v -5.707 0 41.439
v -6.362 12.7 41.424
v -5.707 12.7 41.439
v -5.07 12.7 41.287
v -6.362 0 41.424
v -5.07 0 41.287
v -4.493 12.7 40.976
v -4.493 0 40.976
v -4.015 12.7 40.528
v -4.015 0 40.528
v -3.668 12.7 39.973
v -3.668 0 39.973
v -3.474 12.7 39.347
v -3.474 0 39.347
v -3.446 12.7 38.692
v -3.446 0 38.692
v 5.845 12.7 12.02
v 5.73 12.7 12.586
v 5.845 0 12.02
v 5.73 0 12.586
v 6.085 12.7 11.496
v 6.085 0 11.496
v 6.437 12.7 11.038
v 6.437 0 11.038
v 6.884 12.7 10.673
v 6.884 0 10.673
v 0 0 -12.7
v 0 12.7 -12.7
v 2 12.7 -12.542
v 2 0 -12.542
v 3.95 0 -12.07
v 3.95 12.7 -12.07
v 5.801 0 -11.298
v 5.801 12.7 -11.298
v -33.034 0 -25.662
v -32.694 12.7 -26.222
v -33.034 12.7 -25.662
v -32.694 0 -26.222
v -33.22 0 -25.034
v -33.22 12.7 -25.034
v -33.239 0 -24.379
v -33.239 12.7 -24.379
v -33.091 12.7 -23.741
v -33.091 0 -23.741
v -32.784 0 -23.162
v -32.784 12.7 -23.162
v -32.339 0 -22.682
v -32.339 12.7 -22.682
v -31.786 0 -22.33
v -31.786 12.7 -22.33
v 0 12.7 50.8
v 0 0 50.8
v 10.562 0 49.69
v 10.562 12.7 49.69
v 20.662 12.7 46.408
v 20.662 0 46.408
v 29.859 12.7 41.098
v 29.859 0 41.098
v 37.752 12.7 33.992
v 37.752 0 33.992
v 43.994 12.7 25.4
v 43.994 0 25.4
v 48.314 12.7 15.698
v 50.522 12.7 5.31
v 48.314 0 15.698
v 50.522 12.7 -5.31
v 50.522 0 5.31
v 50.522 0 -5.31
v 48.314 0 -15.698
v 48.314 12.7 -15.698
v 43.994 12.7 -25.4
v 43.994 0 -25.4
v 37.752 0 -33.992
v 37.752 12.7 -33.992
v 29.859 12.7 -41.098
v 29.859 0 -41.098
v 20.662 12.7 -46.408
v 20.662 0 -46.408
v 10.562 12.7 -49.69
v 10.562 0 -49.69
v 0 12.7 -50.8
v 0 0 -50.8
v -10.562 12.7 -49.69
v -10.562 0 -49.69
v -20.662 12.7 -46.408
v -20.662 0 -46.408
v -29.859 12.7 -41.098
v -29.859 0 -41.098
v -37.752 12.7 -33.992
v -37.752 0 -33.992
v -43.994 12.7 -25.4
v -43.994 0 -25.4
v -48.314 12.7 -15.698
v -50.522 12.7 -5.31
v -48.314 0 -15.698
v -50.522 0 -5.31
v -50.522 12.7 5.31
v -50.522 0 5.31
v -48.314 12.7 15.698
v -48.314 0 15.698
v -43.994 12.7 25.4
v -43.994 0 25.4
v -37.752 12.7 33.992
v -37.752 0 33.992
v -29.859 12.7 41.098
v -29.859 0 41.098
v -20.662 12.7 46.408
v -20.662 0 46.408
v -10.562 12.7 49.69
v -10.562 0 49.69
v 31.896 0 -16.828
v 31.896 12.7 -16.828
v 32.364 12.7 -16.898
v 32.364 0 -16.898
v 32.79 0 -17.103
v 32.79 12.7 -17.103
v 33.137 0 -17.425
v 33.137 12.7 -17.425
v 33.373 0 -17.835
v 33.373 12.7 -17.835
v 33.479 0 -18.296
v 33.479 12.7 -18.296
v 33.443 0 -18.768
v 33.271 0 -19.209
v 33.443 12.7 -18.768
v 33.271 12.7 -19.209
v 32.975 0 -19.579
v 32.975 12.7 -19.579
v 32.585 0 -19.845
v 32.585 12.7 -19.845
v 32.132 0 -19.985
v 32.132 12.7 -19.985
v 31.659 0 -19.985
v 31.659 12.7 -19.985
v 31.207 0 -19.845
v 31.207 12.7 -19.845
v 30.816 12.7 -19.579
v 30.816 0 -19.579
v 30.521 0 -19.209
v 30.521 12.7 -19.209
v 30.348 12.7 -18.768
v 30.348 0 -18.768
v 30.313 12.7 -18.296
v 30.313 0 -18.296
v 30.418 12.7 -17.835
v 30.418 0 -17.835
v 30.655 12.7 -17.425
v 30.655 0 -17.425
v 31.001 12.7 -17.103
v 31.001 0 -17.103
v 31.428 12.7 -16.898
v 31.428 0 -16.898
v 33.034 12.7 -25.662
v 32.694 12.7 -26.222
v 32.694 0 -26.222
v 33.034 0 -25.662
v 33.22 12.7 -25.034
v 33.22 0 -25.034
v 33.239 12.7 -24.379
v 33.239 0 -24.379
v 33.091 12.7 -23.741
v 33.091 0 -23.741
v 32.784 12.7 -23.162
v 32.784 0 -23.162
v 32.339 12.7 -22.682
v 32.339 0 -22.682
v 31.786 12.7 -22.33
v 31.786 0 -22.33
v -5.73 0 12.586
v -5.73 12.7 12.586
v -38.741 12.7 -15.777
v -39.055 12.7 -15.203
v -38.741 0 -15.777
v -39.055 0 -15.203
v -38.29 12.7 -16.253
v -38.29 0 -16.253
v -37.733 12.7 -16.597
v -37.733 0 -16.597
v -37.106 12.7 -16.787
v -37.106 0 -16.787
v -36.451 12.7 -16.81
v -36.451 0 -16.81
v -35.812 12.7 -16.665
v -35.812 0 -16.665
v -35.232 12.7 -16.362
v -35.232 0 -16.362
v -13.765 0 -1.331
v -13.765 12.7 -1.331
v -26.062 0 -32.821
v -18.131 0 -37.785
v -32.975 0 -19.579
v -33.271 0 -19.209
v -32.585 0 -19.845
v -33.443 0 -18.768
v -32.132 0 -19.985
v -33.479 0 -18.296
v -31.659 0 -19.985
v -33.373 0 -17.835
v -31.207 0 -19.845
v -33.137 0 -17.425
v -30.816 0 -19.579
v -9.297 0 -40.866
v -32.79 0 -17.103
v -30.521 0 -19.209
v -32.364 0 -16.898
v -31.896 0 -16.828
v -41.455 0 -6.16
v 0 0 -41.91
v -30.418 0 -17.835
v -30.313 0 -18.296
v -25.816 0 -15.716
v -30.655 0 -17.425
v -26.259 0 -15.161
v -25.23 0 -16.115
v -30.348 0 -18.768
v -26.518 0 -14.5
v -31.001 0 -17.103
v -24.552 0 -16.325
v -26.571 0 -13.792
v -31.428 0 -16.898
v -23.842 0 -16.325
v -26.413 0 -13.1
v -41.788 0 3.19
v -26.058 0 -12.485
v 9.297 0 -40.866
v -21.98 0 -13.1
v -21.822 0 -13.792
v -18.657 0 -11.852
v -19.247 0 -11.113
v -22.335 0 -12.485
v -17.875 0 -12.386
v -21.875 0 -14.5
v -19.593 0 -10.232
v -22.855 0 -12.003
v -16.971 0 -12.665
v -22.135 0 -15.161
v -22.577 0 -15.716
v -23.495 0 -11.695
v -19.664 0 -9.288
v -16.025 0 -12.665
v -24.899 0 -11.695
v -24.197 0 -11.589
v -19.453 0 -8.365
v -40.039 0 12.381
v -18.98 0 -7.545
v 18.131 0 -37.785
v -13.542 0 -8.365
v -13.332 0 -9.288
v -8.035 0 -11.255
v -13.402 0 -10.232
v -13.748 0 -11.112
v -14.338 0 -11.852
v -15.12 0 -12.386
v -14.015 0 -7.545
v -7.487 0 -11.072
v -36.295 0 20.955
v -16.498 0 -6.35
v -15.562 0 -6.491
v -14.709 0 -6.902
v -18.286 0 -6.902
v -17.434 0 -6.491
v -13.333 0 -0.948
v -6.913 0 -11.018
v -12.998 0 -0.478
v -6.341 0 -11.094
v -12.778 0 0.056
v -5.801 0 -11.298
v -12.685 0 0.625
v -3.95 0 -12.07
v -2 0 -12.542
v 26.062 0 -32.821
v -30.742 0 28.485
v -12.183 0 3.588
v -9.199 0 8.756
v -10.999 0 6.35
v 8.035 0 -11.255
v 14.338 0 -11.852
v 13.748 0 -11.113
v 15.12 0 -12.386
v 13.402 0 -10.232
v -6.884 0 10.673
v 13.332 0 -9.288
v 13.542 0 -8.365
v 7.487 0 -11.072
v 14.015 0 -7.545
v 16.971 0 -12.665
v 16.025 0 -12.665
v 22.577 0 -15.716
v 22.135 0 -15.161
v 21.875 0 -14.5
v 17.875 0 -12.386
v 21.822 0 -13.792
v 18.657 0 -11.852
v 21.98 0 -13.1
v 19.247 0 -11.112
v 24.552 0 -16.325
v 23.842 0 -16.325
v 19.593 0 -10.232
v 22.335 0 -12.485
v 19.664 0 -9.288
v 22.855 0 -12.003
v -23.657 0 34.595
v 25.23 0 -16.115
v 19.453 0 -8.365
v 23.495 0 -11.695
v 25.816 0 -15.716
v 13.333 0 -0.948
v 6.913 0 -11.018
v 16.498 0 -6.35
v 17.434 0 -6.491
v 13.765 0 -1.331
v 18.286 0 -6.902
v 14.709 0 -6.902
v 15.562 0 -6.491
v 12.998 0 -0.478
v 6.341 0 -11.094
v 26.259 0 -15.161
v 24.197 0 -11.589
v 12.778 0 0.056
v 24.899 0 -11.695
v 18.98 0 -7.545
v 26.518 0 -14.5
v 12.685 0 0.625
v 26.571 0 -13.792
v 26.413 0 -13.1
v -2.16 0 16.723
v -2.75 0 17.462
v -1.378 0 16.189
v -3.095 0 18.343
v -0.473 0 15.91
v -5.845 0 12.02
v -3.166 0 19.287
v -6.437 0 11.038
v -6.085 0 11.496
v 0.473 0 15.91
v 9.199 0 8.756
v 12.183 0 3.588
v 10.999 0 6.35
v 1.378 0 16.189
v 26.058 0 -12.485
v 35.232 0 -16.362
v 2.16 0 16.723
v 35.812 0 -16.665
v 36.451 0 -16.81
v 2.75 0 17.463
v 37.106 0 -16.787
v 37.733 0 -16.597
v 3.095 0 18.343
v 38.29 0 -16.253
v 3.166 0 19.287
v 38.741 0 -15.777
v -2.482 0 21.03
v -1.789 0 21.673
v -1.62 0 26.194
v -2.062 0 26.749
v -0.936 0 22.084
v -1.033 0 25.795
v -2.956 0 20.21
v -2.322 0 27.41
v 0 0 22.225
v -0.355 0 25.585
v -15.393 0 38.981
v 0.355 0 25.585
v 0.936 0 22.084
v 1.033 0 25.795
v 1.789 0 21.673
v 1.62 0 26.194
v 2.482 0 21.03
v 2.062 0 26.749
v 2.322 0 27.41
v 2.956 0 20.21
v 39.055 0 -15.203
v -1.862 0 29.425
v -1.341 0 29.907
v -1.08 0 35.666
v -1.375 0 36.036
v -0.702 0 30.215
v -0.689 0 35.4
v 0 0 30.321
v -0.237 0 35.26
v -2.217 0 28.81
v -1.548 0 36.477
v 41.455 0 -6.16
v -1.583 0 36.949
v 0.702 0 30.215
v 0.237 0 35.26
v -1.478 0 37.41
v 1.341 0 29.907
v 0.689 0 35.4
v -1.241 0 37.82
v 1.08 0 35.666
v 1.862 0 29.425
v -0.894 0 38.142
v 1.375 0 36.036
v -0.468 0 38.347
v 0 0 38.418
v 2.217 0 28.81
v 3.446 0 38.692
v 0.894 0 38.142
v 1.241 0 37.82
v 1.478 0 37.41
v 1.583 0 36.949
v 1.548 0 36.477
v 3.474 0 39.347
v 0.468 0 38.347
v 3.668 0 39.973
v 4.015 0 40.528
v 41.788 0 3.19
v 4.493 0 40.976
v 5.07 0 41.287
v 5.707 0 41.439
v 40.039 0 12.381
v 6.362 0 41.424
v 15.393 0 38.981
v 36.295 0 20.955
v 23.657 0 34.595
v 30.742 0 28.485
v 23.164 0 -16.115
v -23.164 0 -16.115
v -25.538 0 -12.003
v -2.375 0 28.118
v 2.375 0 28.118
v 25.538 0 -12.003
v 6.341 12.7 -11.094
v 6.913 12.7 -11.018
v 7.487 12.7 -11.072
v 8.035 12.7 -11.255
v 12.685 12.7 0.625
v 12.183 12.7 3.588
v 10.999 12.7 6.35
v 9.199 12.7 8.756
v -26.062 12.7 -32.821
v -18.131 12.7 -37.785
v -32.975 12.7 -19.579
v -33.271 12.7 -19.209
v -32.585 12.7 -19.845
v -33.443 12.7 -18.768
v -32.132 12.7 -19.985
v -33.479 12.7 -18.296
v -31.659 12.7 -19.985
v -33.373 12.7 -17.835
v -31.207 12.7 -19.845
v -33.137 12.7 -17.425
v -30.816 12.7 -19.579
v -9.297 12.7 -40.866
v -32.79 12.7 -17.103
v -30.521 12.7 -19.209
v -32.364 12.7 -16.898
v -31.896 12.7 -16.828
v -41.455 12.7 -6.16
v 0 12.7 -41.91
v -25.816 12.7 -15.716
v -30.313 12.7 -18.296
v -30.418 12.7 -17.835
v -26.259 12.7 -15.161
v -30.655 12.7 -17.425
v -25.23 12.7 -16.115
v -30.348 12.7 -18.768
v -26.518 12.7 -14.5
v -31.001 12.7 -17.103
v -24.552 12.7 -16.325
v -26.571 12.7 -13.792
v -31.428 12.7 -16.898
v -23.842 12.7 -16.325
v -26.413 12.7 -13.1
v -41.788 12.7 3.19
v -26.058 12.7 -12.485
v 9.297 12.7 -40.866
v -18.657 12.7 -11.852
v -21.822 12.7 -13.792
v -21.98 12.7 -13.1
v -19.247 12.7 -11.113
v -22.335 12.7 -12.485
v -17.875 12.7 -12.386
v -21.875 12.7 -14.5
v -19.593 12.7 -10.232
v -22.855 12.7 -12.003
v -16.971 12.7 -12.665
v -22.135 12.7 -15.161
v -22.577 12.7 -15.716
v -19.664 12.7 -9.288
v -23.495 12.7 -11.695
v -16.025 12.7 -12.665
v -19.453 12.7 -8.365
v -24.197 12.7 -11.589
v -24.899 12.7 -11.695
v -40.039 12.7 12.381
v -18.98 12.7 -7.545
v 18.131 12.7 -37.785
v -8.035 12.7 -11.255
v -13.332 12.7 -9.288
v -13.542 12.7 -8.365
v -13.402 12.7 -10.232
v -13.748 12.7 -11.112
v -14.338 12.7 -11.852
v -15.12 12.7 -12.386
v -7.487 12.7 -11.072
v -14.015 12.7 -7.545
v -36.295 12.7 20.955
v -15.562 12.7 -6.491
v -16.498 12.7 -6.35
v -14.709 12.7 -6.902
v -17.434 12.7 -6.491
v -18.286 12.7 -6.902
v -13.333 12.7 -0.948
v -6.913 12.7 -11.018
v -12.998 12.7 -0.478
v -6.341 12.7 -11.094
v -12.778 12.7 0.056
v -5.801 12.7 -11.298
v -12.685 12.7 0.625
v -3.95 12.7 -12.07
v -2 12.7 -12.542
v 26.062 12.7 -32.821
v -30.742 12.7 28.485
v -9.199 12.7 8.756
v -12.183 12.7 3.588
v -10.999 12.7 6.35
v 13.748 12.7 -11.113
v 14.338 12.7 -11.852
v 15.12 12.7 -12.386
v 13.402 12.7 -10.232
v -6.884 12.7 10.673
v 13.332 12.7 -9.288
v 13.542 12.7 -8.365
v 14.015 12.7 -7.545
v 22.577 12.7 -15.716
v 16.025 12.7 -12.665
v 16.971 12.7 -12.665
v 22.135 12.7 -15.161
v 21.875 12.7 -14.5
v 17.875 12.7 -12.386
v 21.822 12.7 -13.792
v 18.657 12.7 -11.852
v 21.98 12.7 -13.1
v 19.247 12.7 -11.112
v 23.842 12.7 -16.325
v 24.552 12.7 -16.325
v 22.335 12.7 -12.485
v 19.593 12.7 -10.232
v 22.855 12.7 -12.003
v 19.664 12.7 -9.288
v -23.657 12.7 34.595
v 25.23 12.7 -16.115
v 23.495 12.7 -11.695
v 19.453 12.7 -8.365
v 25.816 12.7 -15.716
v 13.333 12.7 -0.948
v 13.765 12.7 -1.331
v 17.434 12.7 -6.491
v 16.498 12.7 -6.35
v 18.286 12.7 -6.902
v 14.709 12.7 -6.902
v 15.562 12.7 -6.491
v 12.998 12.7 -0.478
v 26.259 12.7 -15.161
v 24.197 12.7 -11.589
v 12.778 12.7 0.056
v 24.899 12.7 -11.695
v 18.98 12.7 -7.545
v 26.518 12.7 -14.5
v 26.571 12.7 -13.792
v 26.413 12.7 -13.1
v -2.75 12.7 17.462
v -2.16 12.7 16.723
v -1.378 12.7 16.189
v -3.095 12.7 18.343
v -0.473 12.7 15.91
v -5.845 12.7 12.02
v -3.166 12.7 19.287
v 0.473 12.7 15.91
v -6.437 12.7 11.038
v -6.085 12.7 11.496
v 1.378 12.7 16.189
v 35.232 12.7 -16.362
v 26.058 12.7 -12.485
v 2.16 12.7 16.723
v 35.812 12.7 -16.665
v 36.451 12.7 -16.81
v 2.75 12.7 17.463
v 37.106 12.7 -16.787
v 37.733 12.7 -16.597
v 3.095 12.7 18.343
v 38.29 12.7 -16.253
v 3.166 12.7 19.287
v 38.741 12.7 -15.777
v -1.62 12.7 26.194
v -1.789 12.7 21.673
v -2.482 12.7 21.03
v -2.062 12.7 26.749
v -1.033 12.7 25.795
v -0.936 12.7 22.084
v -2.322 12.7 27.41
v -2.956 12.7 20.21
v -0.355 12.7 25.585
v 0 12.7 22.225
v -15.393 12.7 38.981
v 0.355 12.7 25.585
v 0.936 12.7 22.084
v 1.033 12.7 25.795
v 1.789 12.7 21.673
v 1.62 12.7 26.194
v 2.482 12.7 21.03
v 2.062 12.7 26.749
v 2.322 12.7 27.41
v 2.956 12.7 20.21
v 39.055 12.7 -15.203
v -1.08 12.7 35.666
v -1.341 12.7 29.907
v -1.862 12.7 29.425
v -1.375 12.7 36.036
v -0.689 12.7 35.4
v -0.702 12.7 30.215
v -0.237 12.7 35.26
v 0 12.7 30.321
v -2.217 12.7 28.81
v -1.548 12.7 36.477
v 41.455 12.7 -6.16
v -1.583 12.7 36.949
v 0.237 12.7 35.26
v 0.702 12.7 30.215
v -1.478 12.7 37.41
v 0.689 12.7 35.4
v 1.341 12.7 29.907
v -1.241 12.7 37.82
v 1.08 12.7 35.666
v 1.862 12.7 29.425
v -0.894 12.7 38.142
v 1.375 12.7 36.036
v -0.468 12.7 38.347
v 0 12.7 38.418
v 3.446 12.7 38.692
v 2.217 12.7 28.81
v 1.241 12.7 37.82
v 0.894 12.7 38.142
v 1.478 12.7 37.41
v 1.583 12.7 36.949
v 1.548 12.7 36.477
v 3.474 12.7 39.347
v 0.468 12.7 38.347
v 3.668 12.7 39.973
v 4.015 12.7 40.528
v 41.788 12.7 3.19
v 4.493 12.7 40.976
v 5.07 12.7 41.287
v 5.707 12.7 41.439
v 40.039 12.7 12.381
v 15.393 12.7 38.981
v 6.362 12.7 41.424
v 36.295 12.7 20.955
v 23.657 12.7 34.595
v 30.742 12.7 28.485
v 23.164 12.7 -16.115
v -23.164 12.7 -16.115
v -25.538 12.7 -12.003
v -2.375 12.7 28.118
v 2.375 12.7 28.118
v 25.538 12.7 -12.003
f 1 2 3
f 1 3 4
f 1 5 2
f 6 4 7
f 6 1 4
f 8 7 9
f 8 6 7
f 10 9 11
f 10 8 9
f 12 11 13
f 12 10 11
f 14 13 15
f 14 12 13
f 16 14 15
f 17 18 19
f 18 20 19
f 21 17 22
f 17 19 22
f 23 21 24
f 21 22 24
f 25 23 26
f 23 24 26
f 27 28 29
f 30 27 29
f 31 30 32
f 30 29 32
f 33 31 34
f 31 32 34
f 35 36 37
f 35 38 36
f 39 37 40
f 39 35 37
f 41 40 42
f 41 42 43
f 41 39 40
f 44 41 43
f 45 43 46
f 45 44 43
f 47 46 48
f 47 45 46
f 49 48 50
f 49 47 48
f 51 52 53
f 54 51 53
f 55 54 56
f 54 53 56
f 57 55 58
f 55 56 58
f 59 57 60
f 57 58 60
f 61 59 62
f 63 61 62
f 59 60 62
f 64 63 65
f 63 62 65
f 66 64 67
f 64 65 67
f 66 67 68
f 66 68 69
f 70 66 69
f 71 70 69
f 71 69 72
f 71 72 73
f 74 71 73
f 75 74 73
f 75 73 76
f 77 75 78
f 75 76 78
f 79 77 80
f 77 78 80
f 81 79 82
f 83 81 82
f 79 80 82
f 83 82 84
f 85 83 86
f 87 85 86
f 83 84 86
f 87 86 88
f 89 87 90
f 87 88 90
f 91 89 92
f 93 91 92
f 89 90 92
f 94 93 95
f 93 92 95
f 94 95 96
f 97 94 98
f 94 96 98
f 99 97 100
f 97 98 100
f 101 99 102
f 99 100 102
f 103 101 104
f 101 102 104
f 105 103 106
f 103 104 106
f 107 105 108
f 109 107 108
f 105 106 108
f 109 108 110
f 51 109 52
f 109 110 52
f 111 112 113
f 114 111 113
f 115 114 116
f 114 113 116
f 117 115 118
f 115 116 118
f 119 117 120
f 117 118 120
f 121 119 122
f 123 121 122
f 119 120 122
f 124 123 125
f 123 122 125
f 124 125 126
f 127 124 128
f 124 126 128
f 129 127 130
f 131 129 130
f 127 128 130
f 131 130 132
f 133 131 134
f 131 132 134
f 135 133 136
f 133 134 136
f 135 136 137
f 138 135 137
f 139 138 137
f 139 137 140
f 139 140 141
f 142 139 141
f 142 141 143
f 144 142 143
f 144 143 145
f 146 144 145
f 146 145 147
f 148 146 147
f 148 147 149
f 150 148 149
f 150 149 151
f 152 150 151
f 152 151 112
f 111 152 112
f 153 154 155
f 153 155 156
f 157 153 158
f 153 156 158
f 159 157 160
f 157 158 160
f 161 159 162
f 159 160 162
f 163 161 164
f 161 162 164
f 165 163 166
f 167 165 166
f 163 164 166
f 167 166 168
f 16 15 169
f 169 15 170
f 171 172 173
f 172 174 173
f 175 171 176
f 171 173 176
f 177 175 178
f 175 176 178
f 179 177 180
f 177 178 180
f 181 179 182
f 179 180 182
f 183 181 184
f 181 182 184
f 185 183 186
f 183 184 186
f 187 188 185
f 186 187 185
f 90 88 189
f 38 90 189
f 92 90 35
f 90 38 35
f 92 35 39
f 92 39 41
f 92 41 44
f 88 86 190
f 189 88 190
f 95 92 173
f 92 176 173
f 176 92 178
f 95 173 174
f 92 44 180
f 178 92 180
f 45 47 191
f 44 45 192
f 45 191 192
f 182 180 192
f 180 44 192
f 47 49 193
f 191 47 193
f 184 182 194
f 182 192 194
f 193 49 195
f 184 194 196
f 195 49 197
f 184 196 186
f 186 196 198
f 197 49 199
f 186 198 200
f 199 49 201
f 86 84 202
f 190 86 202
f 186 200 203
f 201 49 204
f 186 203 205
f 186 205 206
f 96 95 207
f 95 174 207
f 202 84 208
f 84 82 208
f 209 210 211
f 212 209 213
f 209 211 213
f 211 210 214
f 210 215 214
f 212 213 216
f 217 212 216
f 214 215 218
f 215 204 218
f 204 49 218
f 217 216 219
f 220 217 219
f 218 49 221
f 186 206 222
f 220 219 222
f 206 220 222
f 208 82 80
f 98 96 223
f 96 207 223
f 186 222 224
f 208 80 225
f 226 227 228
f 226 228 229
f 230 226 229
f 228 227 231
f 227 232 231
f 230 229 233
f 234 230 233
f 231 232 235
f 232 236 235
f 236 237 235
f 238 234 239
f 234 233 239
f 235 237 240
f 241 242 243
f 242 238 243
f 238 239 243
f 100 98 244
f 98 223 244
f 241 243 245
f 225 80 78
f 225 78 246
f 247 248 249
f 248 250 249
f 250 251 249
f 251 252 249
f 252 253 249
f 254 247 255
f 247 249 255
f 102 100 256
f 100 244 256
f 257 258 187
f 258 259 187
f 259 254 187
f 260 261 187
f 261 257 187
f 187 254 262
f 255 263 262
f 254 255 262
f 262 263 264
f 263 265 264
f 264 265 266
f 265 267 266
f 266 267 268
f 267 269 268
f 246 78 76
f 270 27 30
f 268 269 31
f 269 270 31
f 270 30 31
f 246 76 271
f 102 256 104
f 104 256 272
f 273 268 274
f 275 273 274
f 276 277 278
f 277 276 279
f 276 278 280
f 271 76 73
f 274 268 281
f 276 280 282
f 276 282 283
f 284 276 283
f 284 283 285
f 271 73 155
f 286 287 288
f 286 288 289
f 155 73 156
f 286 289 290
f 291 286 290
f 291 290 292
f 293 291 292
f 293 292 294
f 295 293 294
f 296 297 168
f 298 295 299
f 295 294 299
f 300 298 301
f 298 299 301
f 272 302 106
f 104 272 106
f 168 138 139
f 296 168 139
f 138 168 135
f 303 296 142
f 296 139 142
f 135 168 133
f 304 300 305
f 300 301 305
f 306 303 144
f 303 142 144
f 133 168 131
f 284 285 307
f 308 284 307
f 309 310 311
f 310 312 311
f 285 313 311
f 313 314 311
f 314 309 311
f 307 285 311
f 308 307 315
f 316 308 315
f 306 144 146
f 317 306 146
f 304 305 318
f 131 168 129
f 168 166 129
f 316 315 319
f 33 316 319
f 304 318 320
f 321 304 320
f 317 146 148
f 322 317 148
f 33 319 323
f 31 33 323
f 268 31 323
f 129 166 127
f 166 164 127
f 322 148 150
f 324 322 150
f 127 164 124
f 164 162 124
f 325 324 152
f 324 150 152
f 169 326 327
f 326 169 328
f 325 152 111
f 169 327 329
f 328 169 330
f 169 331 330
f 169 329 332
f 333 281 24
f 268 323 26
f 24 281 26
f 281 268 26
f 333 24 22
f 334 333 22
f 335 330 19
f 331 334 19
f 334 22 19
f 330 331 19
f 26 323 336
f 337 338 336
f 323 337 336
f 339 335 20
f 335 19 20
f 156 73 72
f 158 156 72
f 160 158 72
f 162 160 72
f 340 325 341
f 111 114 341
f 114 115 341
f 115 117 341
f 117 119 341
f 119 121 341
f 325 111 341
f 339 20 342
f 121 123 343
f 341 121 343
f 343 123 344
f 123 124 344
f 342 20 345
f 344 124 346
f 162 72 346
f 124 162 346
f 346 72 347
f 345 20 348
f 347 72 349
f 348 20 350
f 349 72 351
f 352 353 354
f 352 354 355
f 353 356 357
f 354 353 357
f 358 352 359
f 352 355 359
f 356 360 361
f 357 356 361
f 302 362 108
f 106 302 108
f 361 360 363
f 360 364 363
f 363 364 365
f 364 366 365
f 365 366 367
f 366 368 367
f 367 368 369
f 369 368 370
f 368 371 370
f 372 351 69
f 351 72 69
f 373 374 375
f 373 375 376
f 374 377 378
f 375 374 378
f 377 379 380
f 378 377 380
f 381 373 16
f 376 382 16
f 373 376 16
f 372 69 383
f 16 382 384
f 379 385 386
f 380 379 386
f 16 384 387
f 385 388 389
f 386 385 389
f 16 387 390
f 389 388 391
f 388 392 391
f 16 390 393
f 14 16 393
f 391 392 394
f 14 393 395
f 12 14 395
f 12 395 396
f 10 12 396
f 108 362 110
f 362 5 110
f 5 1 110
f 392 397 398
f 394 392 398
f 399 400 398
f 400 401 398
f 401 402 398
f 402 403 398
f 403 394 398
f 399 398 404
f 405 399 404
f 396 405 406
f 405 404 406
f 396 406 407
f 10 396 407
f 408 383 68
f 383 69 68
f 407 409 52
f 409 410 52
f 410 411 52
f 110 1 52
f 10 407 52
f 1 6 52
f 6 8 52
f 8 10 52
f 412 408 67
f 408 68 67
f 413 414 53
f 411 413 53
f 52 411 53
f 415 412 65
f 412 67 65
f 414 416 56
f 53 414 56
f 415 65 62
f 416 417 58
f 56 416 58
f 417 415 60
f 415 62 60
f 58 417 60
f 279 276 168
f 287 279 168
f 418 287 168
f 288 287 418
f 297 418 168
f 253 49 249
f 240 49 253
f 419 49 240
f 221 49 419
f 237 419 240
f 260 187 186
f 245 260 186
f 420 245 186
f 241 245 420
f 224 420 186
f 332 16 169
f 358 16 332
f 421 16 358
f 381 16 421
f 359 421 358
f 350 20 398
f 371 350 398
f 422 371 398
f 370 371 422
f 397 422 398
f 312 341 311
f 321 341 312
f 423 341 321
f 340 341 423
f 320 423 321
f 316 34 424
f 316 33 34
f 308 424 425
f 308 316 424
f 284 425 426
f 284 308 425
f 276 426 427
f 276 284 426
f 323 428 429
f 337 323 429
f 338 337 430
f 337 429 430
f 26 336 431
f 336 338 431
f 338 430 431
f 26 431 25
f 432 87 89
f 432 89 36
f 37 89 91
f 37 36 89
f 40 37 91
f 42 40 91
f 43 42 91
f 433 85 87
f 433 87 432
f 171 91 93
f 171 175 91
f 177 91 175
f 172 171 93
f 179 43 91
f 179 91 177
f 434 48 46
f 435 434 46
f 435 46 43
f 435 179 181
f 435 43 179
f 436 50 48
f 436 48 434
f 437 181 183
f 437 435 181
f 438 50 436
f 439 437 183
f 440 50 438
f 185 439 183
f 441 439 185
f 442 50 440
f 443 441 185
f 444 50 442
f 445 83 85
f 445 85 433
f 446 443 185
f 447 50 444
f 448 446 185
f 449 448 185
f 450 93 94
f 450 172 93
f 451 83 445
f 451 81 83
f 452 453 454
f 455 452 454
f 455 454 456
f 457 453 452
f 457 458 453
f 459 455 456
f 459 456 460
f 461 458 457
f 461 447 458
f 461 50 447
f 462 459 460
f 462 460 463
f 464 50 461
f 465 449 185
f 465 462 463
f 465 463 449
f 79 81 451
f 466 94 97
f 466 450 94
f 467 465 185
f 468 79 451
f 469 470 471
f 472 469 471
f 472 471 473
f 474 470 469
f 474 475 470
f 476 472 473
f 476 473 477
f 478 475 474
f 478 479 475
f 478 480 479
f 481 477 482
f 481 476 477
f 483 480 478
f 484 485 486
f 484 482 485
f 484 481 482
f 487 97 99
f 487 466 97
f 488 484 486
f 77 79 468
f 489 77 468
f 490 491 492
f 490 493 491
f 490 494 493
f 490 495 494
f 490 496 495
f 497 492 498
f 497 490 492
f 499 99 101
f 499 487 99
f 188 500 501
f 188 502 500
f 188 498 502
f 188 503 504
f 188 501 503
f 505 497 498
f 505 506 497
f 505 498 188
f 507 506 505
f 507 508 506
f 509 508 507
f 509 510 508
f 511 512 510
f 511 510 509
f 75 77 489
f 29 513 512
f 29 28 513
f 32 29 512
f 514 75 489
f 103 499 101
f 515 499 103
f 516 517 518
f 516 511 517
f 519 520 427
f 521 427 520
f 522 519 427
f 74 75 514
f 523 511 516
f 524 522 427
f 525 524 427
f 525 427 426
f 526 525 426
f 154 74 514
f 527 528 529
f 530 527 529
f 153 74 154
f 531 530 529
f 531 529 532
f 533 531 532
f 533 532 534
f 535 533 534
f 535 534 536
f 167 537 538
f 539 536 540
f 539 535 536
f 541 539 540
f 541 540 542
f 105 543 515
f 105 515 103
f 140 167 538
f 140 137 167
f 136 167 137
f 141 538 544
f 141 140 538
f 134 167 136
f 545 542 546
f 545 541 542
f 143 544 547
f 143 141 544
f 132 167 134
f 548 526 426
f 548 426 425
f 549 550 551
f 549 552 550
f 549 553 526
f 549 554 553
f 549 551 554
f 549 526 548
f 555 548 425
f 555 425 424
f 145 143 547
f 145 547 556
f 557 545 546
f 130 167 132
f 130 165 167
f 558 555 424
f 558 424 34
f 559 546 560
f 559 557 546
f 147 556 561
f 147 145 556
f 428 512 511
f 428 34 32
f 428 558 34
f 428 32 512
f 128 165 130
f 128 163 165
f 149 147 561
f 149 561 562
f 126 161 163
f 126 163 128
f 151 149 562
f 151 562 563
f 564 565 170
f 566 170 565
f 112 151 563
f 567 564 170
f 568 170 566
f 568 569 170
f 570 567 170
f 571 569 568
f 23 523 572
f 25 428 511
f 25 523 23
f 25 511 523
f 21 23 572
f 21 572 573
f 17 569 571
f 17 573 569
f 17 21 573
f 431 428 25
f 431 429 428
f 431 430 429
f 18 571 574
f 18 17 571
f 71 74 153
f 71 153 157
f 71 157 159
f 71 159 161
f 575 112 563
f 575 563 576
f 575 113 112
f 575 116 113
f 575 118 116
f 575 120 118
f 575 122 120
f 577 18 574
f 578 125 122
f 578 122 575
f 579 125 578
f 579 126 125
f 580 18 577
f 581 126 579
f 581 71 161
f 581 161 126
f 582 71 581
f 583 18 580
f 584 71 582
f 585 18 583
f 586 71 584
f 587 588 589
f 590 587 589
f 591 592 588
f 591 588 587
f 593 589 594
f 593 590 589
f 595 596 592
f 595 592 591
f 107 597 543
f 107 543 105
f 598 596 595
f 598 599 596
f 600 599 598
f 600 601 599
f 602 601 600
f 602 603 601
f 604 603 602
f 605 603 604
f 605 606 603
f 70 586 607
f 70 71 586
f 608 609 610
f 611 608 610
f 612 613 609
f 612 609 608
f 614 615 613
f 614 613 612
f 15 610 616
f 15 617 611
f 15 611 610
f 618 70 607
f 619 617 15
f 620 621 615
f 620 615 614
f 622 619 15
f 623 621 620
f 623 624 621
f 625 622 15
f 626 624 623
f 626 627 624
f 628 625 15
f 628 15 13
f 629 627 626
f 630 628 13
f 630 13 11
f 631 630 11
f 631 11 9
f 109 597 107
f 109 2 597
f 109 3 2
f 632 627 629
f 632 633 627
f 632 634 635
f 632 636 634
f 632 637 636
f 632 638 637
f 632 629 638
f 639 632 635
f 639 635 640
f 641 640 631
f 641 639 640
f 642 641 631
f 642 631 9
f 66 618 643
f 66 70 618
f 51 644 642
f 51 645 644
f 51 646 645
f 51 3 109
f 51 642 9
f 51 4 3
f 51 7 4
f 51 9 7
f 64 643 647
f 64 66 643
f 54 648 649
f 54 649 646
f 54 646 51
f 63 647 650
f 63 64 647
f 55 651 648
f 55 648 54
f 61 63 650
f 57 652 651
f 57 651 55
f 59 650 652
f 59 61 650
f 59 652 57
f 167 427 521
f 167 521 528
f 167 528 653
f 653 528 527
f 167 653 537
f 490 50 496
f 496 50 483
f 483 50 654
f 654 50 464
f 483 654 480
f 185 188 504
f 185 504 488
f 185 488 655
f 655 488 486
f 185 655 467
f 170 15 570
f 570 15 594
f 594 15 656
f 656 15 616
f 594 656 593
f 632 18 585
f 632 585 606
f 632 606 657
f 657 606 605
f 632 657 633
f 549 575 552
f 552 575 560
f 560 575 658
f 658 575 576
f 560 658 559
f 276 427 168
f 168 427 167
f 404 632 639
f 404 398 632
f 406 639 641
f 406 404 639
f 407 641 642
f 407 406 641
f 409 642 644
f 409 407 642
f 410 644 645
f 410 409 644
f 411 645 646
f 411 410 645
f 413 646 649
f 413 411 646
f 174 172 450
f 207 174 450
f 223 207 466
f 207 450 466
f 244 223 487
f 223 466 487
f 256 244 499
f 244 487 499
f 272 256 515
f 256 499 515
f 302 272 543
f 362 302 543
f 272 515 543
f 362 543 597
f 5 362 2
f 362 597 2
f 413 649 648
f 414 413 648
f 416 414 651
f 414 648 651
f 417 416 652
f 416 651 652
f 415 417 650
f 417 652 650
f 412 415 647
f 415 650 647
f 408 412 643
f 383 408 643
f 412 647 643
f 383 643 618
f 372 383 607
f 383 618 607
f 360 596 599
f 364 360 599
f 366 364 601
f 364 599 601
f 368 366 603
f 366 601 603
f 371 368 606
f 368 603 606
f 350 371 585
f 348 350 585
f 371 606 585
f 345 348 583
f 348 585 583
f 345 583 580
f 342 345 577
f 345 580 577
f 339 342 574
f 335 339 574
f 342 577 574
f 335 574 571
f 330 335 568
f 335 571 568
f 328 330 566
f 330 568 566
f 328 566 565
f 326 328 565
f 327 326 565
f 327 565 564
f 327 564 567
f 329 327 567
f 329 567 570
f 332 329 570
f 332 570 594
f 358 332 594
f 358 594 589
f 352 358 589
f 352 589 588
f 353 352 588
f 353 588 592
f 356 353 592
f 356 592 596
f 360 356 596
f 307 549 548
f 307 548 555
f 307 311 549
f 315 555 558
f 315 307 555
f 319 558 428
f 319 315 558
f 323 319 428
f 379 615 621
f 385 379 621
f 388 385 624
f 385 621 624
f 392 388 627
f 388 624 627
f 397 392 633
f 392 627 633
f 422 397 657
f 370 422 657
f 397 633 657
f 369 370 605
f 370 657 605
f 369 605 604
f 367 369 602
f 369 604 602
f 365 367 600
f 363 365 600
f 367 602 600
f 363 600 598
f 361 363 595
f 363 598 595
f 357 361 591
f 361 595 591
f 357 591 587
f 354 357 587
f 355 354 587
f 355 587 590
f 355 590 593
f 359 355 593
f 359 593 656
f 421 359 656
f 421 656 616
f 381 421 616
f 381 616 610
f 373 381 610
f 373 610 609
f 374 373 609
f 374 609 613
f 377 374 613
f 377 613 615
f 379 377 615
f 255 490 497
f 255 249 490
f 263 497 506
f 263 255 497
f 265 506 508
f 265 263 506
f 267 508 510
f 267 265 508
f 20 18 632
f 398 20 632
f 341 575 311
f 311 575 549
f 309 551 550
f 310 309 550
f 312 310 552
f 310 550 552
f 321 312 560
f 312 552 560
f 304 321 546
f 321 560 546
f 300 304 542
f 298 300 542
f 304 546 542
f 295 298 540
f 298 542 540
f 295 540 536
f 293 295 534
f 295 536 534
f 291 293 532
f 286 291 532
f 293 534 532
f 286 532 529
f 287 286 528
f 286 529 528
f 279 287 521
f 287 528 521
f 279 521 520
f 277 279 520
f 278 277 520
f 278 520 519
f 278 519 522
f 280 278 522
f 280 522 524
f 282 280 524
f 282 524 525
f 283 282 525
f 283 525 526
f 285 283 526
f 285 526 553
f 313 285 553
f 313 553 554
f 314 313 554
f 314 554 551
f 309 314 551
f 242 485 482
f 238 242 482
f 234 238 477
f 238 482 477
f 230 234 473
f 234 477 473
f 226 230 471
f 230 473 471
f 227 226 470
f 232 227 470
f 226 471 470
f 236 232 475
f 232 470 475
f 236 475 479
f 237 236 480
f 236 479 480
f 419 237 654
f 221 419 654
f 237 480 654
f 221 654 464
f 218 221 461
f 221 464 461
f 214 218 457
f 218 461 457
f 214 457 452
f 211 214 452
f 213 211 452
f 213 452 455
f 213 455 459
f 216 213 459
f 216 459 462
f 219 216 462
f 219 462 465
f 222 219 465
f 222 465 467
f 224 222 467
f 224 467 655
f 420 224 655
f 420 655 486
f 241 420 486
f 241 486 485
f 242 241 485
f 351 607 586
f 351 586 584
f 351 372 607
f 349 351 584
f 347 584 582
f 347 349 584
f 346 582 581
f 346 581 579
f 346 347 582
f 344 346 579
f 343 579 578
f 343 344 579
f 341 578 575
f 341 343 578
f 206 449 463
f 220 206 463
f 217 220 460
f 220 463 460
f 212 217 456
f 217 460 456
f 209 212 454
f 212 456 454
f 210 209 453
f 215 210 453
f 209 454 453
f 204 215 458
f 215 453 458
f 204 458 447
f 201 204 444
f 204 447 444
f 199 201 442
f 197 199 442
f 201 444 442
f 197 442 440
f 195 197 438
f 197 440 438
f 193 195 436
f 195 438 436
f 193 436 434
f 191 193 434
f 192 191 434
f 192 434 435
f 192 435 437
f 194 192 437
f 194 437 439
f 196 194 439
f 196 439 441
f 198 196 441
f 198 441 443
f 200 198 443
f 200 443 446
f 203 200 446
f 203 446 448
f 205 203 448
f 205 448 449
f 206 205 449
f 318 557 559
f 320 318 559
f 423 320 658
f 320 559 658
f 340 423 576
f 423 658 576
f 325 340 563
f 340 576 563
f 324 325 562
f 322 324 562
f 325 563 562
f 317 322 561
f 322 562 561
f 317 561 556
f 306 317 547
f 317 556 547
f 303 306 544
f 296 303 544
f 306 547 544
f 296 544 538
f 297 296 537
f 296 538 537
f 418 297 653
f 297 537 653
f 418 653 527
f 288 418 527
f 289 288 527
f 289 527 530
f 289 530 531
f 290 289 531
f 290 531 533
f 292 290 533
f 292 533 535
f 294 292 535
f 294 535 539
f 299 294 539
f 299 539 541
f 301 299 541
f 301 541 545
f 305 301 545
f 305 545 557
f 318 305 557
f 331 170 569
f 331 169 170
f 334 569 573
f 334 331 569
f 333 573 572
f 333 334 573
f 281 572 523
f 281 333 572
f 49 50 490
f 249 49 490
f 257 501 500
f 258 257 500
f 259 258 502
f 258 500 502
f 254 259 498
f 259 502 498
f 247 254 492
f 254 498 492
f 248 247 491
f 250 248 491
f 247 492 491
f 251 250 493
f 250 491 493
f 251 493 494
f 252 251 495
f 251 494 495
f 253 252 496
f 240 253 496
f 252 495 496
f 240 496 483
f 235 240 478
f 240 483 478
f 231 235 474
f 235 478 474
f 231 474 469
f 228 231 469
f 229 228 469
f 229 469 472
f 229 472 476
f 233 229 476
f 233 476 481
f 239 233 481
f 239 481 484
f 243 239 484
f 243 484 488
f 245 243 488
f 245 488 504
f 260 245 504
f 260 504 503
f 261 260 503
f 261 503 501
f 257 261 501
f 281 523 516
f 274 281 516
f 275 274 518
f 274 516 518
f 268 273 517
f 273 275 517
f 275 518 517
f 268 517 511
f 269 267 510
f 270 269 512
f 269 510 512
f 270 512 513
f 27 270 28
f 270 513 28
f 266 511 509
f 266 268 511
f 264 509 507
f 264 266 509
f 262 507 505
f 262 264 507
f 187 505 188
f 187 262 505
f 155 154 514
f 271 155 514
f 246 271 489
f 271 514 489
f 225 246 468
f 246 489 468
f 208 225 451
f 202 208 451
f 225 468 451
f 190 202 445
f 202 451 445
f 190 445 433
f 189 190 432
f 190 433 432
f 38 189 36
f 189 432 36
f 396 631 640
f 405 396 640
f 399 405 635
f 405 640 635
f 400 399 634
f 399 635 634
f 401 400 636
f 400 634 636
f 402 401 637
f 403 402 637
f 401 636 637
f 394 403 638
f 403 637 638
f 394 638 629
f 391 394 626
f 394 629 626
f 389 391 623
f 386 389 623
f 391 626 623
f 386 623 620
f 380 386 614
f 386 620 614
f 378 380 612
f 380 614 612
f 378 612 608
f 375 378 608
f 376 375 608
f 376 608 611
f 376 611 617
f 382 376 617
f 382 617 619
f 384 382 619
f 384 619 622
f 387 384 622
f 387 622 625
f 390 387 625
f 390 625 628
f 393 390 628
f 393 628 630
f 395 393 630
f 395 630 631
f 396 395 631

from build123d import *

# Parameters (mm, degrees)
SKETCH1_R           = 50.8
BOSS_EXTRUDE1_DEPTH = 12.7
SKETCH2_R           = 3.175
SKETCH2_R_2         = 2.38125
SKETCH2_R_3         = 1.5875
CUT_EXTRUDE1_DEPTH  = 73.955945611
FILLET1_R           = 2.54


with BuildPart() as part:
    # Sketch1 → Boss-Extrude1 (new body)
    with BuildSketch(Plane(origin=(0, 0, 0), x_dir=(1, 0, 0), z_dir=(0, 1, 0))):
        Circle(SKETCH1_R)
    extrude(amount=BOSS_EXTRUDE1_DEPTH)

    # Sketch2 → Cut-Extrude1 (cut, through all)
    with BuildSketch(Plane(origin=(0, 12.7, 0), x_dir=(1, 0, 0), z_dir=(0, 1, 0))):
        with BuildLine():
            Line((5.844661521, -11.275190983), (3.175, -41.789561795))
            ThreePointArc((3.175, -41.789561795), (36.295124673, -20.955), (37.778322127, 18.14515024))
            Line((37.778322127, 18.14515024), (12.686932584, 0.575970138))
            ThreePointArc((12.686932584, 0.575970138), (10.998522628, -6.35), (5.844661521, -11.275190983))
        make_face()
        with BuildLine():
            ThreePointArc((-37.778322127, 18.14515024), (-36.295124673, -20.955), (-3.175, -41.789561795))
            Line((-3.175, -41.789561795), (-5.844661521, -11.275190983))
            ThreePointArc((-5.844661521, -11.275190983), (-10.998522628, -6.35), (-12.686932584, 0.575970138))
            Line((-12.686932584, 0.575970138), (-37.778322127, 18.14515024))
        make_face()
        with BuildLine():
            ThreePointArc((34.603322127, 23.644411554), (0, 41.91), (-34.603322127, 23.644411554))
            Line((-34.603322127, 23.644411554), (-6.842271064, 10.699220845))
            ThreePointArc((-6.842271064, 10.699220845), (-3.564400038, 12.189546848), (0, 12.7))
            ThreePointArc((0, 12.7), (3.564400038, 12.189546848), (6.842271064, 10.699220845))
            Line((6.842271064, 10.699220845), (34.603322127, 23.644411554))
        make_face()
        with Locations((0, -19.05)):
            Circle(SKETCH2_R)
        with Locations((0, -27.94)):
            Circle(SKETCH2_R_2)
        with Locations((0, -36.83)):
            Circle(SKETCH2_R_3)
        with Locations((-16.497783942, 9.525)):
            Circle(SKETCH2_R)
        with Locations((-24.196749782, 13.97)):
            Circle(SKETCH2_R_2)
        with Locations((-31.895715621, 18.415)):
            Circle(SKETCH2_R_3)
        with Locations((16.497783942, 9.525)):
            Circle(SKETCH2_R)
        with Locations((24.196749782, 13.97)):
            Circle(SKETCH2_R_2)
        with Locations((31.895715621, 18.415)):
            Circle(SKETCH2_R_3)
    extrude(amount=-CUT_EXTRUDE1_DEPTH, mode=Mode.SUBTRACT)

    # Fillet1
    fillet1_edges = [part.edges().sort_by_distance(p)[0] for p in [
        (37.778322127, 6.35, -18.14515024),
        (34.603322127, 6.35, -23.644411554),
        (-6.842271064, 6.35, -10.699220845),
        (6.842271064, 6.35, -10.699220845),
        (12.686932584, 6.35, -0.575970138),
        (-12.686932584, 6.35, -0.575970138),
        (-5.844661521, 6.35, 11.275190983),
        (-3.175, 6.35, 41.789561795),
        (3.175, 6.35, 41.789561795),
        (5.844661521, 6.35, 11.275190983),
        (-34.603322127, 6.35, -23.644411554),
        (-37.778322127, 6.35, -18.14515024),
    ]]
    fillet(fillet1_edges, radius=FILLET1_R)


solid = part.part
